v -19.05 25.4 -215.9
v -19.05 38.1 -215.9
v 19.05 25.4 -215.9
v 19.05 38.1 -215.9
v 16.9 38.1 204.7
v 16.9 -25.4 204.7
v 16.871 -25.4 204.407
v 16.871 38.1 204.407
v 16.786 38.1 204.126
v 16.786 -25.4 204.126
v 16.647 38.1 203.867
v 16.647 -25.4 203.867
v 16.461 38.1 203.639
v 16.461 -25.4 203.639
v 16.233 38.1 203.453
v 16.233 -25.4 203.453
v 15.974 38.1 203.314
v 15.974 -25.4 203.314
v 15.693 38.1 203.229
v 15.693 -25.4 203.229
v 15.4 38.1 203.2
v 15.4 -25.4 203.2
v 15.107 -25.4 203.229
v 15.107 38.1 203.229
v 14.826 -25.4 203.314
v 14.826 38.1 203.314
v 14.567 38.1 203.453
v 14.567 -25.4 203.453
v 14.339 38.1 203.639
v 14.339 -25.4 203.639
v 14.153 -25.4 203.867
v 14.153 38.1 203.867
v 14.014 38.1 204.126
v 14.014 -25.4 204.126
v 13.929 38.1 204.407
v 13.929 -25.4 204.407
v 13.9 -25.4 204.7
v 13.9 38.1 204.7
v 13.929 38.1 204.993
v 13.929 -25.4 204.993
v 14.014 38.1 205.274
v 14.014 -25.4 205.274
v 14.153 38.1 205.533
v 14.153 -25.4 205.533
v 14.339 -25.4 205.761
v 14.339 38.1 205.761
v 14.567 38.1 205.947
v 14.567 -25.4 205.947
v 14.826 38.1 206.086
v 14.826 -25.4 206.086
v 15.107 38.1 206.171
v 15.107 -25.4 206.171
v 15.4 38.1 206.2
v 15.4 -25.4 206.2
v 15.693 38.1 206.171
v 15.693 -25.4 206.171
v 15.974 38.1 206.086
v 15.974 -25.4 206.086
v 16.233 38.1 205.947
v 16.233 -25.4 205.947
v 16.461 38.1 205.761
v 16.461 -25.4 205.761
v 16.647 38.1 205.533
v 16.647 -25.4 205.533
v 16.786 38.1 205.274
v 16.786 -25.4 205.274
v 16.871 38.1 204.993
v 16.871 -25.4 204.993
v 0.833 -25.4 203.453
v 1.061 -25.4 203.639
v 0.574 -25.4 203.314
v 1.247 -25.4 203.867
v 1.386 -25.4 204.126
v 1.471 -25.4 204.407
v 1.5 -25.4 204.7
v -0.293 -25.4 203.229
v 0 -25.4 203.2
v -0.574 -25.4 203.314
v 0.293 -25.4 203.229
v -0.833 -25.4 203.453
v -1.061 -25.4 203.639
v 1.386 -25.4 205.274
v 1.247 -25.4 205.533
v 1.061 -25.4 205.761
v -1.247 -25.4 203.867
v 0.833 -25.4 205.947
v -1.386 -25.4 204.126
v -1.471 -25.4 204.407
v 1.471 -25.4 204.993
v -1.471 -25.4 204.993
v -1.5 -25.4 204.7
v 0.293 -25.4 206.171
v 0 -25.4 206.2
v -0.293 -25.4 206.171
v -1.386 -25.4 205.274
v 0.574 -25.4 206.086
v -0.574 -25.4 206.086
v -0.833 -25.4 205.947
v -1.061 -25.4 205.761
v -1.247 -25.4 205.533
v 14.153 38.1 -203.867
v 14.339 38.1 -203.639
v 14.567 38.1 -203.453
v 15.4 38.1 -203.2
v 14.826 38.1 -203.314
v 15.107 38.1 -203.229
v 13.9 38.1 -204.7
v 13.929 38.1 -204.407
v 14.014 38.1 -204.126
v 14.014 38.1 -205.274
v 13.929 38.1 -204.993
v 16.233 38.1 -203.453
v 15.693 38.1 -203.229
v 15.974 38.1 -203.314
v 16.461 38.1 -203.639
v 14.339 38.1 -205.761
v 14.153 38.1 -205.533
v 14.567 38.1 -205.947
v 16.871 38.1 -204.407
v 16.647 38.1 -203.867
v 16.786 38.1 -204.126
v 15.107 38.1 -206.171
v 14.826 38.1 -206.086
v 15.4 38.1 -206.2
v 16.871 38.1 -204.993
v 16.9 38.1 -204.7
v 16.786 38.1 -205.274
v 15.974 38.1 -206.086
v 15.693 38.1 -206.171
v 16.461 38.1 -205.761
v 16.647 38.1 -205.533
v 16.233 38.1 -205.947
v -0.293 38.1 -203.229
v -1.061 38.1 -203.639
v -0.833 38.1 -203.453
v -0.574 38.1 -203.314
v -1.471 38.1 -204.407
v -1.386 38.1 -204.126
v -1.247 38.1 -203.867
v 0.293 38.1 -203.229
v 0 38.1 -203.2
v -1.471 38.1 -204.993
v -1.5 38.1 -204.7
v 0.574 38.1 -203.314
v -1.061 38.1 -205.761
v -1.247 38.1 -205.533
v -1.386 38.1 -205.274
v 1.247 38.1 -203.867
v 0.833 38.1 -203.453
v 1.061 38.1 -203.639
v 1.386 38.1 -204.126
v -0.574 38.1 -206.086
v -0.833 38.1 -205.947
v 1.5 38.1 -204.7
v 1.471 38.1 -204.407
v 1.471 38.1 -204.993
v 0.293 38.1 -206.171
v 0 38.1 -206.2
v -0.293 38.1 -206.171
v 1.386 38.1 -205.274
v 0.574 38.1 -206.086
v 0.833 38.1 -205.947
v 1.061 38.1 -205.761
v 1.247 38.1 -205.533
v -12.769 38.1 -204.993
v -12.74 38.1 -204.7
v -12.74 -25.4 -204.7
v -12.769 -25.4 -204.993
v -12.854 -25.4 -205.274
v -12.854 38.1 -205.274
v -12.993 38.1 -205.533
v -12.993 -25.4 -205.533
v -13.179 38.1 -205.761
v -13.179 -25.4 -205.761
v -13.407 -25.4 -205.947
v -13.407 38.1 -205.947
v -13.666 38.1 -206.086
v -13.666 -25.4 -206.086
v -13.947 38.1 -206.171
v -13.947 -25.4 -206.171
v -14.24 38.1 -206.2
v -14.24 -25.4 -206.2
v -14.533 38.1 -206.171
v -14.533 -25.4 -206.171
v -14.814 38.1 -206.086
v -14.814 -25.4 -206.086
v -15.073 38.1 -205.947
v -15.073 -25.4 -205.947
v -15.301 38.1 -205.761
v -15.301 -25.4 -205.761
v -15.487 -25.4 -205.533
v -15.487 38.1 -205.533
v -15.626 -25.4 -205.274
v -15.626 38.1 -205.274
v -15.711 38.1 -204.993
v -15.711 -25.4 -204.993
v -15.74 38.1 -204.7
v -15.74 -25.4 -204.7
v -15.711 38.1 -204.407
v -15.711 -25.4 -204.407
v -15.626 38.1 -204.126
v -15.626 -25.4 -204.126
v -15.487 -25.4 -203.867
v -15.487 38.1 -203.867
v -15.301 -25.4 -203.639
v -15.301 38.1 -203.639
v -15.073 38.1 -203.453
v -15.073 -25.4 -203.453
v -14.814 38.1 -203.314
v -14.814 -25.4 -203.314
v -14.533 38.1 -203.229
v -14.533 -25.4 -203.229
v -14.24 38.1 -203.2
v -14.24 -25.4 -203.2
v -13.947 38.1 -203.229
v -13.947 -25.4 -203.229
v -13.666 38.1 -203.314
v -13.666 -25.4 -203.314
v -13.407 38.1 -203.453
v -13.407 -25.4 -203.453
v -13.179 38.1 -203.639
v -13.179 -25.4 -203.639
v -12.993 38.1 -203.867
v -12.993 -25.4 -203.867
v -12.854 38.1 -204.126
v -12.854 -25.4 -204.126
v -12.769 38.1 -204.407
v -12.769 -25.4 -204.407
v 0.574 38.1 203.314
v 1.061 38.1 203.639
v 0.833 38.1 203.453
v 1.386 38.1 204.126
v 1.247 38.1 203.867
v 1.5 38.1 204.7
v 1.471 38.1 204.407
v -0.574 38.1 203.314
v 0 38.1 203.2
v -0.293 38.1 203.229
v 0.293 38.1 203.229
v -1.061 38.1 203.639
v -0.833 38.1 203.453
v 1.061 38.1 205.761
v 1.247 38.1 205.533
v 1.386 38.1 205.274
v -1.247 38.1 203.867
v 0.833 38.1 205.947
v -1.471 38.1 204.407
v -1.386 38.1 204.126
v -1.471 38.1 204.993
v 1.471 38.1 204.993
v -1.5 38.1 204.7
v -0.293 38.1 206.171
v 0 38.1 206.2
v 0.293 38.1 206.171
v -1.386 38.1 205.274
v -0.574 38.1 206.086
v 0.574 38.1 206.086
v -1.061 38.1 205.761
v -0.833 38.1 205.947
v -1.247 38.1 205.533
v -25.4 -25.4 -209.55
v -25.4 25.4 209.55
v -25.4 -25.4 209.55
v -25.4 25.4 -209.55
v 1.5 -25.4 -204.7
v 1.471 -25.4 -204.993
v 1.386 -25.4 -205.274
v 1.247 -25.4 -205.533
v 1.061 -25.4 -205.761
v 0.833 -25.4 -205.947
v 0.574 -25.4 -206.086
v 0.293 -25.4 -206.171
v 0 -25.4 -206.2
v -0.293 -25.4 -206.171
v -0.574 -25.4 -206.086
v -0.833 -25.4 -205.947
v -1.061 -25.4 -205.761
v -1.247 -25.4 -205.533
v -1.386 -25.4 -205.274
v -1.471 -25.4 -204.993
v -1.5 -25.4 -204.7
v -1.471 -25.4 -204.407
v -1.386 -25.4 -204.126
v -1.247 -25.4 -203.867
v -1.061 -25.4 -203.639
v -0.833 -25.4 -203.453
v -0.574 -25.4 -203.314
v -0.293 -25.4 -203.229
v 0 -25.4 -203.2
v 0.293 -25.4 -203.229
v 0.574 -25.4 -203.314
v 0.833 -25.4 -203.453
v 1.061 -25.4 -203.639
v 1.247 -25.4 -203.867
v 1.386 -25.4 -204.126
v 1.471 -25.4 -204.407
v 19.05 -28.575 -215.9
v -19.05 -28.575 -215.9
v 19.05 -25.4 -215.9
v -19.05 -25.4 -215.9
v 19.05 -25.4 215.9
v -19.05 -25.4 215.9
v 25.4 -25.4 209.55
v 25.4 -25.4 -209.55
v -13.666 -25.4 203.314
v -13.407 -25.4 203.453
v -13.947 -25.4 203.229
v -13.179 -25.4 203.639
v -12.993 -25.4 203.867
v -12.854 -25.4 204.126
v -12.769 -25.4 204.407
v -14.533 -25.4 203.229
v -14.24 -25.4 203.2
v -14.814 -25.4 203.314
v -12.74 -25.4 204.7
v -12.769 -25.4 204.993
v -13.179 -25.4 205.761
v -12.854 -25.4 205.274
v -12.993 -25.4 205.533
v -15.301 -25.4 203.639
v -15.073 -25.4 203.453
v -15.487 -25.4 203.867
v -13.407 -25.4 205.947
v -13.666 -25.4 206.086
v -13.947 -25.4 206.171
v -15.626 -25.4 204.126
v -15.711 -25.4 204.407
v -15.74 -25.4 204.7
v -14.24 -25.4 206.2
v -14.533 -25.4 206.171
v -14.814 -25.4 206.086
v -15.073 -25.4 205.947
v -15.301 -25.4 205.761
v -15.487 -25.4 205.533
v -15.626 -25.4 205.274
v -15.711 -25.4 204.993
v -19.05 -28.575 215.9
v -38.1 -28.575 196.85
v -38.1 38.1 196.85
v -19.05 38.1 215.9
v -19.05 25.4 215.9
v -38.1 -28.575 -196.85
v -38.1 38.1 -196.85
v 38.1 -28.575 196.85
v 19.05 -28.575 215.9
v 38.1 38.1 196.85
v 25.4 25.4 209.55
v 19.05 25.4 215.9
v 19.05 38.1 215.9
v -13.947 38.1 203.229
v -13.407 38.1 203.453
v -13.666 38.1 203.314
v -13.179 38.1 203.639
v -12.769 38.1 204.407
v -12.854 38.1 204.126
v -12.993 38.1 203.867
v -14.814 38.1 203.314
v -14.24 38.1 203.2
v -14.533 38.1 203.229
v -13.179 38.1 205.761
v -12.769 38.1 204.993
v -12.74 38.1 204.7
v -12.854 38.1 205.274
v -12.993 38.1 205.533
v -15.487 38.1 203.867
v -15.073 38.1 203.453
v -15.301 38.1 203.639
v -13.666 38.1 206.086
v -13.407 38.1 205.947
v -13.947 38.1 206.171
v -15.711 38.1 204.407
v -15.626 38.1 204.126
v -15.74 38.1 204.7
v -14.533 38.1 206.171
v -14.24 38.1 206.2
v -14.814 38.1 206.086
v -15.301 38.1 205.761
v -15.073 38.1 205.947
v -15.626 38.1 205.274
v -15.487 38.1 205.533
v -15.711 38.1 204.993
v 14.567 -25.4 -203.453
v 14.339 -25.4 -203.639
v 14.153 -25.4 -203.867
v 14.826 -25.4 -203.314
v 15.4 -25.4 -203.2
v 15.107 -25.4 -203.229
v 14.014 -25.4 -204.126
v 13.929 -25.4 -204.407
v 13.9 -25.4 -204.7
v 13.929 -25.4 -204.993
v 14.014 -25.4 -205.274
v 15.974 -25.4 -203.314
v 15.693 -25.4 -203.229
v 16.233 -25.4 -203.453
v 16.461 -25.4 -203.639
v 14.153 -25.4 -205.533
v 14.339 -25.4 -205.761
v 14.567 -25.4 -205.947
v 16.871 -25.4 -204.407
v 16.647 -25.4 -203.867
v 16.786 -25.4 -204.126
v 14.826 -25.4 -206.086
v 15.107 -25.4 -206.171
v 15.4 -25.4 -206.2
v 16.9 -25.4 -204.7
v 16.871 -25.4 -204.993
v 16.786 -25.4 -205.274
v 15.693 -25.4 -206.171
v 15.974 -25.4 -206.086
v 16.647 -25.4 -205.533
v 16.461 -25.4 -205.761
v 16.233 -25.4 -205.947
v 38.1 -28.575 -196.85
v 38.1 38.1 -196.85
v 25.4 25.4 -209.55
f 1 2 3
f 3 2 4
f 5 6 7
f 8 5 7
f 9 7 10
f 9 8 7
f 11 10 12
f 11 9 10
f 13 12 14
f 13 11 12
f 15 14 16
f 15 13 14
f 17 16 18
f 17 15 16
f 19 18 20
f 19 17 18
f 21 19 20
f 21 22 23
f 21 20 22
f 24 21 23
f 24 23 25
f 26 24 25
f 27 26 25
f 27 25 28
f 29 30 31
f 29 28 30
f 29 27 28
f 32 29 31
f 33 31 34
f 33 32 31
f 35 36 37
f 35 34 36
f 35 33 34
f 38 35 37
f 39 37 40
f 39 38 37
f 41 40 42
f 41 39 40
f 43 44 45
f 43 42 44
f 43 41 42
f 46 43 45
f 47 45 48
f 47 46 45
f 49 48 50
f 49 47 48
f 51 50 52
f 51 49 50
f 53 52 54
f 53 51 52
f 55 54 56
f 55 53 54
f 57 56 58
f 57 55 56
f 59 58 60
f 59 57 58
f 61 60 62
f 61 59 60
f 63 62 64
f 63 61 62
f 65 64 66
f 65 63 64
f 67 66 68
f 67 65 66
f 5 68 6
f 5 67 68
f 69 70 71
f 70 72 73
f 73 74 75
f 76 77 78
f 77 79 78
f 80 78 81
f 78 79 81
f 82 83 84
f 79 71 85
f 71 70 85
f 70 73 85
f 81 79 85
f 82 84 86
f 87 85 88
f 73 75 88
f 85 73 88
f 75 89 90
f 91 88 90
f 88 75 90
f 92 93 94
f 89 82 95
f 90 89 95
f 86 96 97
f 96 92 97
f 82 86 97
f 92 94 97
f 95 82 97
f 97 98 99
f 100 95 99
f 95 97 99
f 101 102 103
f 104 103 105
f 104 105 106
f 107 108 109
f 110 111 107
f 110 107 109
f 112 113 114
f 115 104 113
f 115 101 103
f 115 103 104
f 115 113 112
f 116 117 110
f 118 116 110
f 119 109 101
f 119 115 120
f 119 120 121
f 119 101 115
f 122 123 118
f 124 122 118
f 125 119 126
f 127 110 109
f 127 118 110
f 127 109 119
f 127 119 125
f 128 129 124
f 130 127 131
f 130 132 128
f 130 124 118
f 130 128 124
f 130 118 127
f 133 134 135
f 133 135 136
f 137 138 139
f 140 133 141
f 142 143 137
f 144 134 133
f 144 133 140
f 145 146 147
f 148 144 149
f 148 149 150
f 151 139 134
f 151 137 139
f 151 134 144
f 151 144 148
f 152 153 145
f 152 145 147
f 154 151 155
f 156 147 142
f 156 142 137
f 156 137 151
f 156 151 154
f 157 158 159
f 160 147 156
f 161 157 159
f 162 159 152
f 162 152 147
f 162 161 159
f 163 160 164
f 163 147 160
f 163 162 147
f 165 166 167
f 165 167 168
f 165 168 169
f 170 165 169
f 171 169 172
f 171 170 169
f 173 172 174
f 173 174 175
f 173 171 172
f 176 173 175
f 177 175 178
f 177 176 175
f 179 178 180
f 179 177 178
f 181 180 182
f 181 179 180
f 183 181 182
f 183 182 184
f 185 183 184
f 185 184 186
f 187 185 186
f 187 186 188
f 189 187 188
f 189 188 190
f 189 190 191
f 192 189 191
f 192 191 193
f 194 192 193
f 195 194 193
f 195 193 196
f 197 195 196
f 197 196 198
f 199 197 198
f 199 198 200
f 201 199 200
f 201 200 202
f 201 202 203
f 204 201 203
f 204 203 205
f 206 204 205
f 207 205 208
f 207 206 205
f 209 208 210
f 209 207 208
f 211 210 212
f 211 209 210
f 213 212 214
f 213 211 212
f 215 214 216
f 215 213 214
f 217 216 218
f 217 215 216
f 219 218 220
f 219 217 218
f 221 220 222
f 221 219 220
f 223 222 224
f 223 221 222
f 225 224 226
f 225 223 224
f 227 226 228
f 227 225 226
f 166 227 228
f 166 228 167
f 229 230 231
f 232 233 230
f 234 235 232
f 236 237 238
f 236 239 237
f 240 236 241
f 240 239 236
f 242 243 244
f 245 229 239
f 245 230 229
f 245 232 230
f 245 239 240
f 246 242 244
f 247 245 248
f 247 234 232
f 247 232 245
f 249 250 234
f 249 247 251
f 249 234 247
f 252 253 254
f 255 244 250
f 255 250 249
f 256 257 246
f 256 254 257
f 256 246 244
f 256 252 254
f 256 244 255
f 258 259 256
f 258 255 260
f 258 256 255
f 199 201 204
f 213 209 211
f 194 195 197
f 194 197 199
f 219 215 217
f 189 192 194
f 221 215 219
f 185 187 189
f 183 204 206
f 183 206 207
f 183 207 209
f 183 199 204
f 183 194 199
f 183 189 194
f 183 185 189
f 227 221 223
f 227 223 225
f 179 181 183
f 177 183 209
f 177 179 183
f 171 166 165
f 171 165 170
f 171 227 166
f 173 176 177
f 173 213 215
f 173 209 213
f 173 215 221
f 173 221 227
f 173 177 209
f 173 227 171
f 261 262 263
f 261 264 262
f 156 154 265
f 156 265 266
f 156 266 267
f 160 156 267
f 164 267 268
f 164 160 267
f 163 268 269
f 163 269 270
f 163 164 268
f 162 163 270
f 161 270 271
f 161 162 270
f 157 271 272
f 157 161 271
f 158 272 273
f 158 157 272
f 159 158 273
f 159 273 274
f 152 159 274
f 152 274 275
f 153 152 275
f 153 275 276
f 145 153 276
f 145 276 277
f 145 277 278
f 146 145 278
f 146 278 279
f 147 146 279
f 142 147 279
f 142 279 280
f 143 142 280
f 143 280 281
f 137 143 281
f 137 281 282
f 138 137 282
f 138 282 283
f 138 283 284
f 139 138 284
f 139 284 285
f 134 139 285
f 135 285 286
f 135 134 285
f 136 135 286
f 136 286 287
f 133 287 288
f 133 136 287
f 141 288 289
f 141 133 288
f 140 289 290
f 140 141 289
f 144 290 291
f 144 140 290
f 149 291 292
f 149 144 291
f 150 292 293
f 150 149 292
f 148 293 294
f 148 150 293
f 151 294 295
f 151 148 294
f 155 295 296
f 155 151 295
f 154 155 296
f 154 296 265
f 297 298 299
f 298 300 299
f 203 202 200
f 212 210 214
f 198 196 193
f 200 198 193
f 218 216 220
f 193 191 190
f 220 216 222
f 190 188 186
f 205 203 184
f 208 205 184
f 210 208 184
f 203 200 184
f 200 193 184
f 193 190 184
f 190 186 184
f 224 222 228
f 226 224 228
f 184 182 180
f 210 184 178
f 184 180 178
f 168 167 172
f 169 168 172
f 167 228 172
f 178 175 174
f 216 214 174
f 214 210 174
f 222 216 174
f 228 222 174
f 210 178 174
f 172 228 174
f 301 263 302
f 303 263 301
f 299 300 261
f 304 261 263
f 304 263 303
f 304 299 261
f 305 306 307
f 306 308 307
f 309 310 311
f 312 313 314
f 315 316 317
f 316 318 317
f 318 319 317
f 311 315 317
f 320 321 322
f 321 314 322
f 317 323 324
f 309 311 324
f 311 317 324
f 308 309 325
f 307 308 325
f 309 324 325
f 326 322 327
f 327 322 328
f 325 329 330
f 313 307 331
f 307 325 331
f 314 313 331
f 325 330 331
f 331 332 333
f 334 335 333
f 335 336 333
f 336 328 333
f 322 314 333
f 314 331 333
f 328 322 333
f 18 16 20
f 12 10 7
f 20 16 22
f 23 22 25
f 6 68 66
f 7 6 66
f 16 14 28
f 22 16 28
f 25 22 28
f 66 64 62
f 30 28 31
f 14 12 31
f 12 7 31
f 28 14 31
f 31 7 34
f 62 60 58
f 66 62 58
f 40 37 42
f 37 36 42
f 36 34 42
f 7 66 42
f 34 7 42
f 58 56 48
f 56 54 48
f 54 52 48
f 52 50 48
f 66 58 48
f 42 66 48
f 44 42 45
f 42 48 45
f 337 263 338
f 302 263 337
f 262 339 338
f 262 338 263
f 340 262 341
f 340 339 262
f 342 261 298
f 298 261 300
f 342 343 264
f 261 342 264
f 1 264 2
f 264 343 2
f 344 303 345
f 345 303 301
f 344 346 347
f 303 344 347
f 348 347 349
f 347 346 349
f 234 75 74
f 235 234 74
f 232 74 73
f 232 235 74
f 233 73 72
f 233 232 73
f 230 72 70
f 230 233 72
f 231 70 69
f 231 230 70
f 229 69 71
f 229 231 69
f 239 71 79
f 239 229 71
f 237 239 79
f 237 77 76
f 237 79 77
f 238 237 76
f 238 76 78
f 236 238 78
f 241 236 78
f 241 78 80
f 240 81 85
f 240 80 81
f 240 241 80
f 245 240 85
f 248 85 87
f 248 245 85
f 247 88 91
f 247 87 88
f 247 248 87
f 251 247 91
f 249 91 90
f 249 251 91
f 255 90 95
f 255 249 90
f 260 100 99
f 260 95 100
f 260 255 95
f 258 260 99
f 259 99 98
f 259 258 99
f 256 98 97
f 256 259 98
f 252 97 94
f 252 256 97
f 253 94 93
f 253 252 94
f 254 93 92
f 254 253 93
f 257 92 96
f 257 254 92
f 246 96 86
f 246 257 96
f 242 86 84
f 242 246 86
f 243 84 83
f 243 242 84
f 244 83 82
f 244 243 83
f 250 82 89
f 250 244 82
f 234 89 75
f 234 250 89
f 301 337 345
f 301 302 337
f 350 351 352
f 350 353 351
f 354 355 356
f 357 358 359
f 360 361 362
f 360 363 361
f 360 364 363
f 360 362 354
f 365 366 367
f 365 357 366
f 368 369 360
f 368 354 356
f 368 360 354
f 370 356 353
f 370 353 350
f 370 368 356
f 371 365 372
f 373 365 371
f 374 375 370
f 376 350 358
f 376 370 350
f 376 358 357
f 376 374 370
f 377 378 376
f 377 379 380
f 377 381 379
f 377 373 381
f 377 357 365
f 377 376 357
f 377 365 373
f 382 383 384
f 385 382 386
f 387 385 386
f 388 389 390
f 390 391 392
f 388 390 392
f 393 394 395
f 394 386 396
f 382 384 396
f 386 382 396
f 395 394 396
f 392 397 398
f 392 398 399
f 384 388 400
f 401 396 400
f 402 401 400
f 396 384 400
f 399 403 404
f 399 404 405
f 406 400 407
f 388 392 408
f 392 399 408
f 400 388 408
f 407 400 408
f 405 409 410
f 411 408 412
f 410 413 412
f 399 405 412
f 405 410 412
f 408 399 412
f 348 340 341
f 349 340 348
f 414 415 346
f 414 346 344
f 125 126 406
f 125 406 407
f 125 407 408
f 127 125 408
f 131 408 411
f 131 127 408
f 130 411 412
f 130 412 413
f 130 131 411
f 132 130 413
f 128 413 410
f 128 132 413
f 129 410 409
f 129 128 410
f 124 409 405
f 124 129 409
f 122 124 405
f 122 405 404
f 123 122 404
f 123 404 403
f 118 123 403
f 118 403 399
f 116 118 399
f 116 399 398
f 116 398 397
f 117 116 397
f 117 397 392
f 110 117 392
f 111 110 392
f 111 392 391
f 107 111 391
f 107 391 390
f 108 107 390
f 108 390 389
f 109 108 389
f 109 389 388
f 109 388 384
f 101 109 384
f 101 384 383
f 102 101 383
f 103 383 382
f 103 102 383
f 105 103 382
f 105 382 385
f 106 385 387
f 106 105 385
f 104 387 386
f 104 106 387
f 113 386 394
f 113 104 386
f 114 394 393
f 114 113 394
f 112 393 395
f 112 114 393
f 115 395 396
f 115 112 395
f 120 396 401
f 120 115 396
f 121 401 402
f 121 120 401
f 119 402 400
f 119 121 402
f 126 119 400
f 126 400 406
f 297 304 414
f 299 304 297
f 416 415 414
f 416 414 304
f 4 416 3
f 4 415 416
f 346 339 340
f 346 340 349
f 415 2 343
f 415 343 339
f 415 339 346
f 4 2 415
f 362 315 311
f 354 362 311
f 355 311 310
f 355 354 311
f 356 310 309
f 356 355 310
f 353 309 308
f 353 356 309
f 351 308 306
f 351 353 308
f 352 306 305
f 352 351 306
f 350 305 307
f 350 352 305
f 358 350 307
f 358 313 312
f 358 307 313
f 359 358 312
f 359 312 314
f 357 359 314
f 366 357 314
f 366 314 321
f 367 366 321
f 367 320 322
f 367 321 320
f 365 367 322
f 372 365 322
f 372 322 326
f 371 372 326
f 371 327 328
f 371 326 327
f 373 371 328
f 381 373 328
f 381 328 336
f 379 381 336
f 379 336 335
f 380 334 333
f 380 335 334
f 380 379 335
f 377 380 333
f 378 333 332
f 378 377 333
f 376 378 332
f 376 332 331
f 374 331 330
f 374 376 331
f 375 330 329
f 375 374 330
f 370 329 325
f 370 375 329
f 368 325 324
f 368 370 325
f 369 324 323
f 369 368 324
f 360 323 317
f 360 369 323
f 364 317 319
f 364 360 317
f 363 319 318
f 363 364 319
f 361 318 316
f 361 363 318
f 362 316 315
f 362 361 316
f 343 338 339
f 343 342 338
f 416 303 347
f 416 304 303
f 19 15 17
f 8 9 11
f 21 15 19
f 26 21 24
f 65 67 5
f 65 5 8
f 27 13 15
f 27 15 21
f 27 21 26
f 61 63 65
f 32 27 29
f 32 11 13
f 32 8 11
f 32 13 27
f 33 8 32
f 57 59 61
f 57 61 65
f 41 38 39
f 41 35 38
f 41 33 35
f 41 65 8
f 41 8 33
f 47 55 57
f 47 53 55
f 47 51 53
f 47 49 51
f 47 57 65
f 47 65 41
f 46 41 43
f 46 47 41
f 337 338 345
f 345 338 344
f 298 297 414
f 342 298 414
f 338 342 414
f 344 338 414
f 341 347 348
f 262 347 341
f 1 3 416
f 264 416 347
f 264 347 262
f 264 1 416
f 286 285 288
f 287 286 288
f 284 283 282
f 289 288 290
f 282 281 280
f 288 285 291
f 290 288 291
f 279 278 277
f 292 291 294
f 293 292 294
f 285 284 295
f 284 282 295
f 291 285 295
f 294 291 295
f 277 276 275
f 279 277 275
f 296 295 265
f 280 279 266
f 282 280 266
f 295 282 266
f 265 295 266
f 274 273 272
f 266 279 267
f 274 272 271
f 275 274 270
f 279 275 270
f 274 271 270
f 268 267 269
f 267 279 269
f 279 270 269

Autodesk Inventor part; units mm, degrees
ref_plane "YZ Plane" through (0, 0, 0) normal (1, 0, 0) x (0, 1, 0)
ref_plane "XZ Plane" through (0, 0, 0) normal (0, 1, 0) x (-1, 0, 0)
ref_plane "XY Plane" through (0, 0, 0) normal (0, 0, 1) x (1, 0, 0)
sketch "Sketch1" plane through (0, 0, 0) normal (0, 0, 1) x (1, 0, 0)
  line L0 (-25.4, -25.4) -> (25.4, -25.4)
  line L1 (25.4, -25.4) -> (25.4, 25.4)
  line L2 (25.4, 25.4) -> (-25.4, 25.4)
  line L3 (-25.4, 25.4) -> (-25.4, -25.4)
  line L4 (-25.4, -25.4) -> (25.4, 25.4) construction
  line L5 (25.4, -25.4) -> (-25.4, 25.4) construction
  line L6 (-38.1, 38.1) -> (38.1, 38.1)
  line L7 (38.1, 38.1) -> (38.1, -38.1)
  line L8 (38.1, -38.1) -> (-38.1, -38.1)
  line L9 (-38.1, -38.1) -> (-38.1, 38.1)
  line L10 (-38.1, -28.575) -> (38.1, -28.575)
  point P0 (0, 0)
  dimension "d0" = 50.8
  dimension "d1" = 50.8
  dimension "d2" = 12.7
  dimension "d3" = 3.175
extrude "Extrusion1" add sketch "Sketch1" along normal mid plane 431.8 contours L6 L7 L10 L9
sketch "Sketch2" plane through (-38.1, 38.1, 215.9) normal (0, 1, 0) x (1, 0, 0)
  line L0 (0, 431.8) -> (0, 0) construction
  line L1 (76.2, 0) -> (0, 0) projected
  line L2 (76.2, 431.8) -> (76.2, 0) construction
  line L3 (0, 431.8) -> (76.2, 431.8) construction
  line L4 (0, 0) -> (0, 431.8) construction
  line L5 (0, 412.75) -> (19.05, 431.8)
  line L6 (0, 412.75) -> (26.9408, 412.75) construction
  line L7 (63.5, 431.8) -> (12.7, 431.8) construction
  line L8 (38.1, 431.8) -> (38.1, 0) construction
  line L9 (0, 0) -> (76.2, 0) projected
  line L10 (0, 412.75) -> (0, 431.8)
  line L11 (0, 431.8) -> (19.05, 431.8)
  line L12 (0, 431.8) -> (76.2, 431.8) projected
  line L13 (76.2, 412.75) -> (57.15, 431.8)
  line L14 (76.2, 412.75) -> (76.2, 431.8)
  line L15 (76.2, 431.8) -> (57.15, 431.8)
  line L16 (0, 215.9) -> (38.1, 215.9) construction
  line L17 (0, 19.05) -> (19.05, 0)
  line L18 (0, 19.05) -> (26.9408, 19.05) construction
  line L19 (0, 19.05) -> (0, 0)
  line L20 (0, 0) -> (19.05, 0)
  line L21 (76.2, 19.05) -> (76.2, 0)
  line L22 (76.2, 0) -> (57.15, 0)
  line L23 (76.2, 19.05) -> (57.15, 0)
  point P0 (63.5, 0)
  point P1 (12.7, 0)
  dimension "d6" = 45
  dimension "d7" = 19.05
extrude "Extrusion2" cut sketch "Sketch2" against normal through all
sketch "Sketch3" plane through (-19.05, 38.1, -215.9) normal (0, 1, 0) x (1, 0, 0)
  line L0 (-6.35, -419.1) -> (44.45, -419.1) construction
  line L1 (44.45, -419.1) -> (44.45, -12.7) construction
  line L2 (44.45, -12.7) -> (-6.35, -12.7) construction
  line L3 (-6.35, -12.7) -> (-6.35, -419.1) construction
  line L4 (-19.05, -19.05) -> (-19.05, -412.75) construction
  line L5 (0, 0) -> (38.1, 0) construction
  line L6 (38.1, -431.8) -> (0, -431.8) construction
  line L7 (-19.05, -412.75) -> (-19.05, -19.05) construction
  line L8 (-19.05, -215.9) -> (19.05, -215.9) construction
  line L9 (38.1, 0) -> (0, 0) construction
  line L10 (19.05, 0) -> (19.05, -215.9) construction
  circle A0 centre (4.8101, -11.2) radius 1.5
  circle A1 centre (34.45, -11.2) radius 1.5
  circle A2 centre (19.05, -11.2) radius 1.5
  point P0 (-6.35, -215.9)
  point P1 (19.05, -12.7)
  point P2 (19.05, 0)
  dimension "d10" = 50.8
  dimension "d11" = 406.4
  dimension "d12" = 3
  dimension "d13" = 3
  dimension "d14" = 3
  dimension "d15" = 11.1601
  dimension "d16" = 10
extrude "Extrusion3" add sketch "Sketch3" against normal up to surface (63.5 mm away) separate body
mirror "Mirror1" about plane through (0, 0, 0) normal (0, 0, 1) of "Extrusion3" bodies 2
properties part number "1112_Magnet Brick Housing_V1" material "Acetal Resin, White"
